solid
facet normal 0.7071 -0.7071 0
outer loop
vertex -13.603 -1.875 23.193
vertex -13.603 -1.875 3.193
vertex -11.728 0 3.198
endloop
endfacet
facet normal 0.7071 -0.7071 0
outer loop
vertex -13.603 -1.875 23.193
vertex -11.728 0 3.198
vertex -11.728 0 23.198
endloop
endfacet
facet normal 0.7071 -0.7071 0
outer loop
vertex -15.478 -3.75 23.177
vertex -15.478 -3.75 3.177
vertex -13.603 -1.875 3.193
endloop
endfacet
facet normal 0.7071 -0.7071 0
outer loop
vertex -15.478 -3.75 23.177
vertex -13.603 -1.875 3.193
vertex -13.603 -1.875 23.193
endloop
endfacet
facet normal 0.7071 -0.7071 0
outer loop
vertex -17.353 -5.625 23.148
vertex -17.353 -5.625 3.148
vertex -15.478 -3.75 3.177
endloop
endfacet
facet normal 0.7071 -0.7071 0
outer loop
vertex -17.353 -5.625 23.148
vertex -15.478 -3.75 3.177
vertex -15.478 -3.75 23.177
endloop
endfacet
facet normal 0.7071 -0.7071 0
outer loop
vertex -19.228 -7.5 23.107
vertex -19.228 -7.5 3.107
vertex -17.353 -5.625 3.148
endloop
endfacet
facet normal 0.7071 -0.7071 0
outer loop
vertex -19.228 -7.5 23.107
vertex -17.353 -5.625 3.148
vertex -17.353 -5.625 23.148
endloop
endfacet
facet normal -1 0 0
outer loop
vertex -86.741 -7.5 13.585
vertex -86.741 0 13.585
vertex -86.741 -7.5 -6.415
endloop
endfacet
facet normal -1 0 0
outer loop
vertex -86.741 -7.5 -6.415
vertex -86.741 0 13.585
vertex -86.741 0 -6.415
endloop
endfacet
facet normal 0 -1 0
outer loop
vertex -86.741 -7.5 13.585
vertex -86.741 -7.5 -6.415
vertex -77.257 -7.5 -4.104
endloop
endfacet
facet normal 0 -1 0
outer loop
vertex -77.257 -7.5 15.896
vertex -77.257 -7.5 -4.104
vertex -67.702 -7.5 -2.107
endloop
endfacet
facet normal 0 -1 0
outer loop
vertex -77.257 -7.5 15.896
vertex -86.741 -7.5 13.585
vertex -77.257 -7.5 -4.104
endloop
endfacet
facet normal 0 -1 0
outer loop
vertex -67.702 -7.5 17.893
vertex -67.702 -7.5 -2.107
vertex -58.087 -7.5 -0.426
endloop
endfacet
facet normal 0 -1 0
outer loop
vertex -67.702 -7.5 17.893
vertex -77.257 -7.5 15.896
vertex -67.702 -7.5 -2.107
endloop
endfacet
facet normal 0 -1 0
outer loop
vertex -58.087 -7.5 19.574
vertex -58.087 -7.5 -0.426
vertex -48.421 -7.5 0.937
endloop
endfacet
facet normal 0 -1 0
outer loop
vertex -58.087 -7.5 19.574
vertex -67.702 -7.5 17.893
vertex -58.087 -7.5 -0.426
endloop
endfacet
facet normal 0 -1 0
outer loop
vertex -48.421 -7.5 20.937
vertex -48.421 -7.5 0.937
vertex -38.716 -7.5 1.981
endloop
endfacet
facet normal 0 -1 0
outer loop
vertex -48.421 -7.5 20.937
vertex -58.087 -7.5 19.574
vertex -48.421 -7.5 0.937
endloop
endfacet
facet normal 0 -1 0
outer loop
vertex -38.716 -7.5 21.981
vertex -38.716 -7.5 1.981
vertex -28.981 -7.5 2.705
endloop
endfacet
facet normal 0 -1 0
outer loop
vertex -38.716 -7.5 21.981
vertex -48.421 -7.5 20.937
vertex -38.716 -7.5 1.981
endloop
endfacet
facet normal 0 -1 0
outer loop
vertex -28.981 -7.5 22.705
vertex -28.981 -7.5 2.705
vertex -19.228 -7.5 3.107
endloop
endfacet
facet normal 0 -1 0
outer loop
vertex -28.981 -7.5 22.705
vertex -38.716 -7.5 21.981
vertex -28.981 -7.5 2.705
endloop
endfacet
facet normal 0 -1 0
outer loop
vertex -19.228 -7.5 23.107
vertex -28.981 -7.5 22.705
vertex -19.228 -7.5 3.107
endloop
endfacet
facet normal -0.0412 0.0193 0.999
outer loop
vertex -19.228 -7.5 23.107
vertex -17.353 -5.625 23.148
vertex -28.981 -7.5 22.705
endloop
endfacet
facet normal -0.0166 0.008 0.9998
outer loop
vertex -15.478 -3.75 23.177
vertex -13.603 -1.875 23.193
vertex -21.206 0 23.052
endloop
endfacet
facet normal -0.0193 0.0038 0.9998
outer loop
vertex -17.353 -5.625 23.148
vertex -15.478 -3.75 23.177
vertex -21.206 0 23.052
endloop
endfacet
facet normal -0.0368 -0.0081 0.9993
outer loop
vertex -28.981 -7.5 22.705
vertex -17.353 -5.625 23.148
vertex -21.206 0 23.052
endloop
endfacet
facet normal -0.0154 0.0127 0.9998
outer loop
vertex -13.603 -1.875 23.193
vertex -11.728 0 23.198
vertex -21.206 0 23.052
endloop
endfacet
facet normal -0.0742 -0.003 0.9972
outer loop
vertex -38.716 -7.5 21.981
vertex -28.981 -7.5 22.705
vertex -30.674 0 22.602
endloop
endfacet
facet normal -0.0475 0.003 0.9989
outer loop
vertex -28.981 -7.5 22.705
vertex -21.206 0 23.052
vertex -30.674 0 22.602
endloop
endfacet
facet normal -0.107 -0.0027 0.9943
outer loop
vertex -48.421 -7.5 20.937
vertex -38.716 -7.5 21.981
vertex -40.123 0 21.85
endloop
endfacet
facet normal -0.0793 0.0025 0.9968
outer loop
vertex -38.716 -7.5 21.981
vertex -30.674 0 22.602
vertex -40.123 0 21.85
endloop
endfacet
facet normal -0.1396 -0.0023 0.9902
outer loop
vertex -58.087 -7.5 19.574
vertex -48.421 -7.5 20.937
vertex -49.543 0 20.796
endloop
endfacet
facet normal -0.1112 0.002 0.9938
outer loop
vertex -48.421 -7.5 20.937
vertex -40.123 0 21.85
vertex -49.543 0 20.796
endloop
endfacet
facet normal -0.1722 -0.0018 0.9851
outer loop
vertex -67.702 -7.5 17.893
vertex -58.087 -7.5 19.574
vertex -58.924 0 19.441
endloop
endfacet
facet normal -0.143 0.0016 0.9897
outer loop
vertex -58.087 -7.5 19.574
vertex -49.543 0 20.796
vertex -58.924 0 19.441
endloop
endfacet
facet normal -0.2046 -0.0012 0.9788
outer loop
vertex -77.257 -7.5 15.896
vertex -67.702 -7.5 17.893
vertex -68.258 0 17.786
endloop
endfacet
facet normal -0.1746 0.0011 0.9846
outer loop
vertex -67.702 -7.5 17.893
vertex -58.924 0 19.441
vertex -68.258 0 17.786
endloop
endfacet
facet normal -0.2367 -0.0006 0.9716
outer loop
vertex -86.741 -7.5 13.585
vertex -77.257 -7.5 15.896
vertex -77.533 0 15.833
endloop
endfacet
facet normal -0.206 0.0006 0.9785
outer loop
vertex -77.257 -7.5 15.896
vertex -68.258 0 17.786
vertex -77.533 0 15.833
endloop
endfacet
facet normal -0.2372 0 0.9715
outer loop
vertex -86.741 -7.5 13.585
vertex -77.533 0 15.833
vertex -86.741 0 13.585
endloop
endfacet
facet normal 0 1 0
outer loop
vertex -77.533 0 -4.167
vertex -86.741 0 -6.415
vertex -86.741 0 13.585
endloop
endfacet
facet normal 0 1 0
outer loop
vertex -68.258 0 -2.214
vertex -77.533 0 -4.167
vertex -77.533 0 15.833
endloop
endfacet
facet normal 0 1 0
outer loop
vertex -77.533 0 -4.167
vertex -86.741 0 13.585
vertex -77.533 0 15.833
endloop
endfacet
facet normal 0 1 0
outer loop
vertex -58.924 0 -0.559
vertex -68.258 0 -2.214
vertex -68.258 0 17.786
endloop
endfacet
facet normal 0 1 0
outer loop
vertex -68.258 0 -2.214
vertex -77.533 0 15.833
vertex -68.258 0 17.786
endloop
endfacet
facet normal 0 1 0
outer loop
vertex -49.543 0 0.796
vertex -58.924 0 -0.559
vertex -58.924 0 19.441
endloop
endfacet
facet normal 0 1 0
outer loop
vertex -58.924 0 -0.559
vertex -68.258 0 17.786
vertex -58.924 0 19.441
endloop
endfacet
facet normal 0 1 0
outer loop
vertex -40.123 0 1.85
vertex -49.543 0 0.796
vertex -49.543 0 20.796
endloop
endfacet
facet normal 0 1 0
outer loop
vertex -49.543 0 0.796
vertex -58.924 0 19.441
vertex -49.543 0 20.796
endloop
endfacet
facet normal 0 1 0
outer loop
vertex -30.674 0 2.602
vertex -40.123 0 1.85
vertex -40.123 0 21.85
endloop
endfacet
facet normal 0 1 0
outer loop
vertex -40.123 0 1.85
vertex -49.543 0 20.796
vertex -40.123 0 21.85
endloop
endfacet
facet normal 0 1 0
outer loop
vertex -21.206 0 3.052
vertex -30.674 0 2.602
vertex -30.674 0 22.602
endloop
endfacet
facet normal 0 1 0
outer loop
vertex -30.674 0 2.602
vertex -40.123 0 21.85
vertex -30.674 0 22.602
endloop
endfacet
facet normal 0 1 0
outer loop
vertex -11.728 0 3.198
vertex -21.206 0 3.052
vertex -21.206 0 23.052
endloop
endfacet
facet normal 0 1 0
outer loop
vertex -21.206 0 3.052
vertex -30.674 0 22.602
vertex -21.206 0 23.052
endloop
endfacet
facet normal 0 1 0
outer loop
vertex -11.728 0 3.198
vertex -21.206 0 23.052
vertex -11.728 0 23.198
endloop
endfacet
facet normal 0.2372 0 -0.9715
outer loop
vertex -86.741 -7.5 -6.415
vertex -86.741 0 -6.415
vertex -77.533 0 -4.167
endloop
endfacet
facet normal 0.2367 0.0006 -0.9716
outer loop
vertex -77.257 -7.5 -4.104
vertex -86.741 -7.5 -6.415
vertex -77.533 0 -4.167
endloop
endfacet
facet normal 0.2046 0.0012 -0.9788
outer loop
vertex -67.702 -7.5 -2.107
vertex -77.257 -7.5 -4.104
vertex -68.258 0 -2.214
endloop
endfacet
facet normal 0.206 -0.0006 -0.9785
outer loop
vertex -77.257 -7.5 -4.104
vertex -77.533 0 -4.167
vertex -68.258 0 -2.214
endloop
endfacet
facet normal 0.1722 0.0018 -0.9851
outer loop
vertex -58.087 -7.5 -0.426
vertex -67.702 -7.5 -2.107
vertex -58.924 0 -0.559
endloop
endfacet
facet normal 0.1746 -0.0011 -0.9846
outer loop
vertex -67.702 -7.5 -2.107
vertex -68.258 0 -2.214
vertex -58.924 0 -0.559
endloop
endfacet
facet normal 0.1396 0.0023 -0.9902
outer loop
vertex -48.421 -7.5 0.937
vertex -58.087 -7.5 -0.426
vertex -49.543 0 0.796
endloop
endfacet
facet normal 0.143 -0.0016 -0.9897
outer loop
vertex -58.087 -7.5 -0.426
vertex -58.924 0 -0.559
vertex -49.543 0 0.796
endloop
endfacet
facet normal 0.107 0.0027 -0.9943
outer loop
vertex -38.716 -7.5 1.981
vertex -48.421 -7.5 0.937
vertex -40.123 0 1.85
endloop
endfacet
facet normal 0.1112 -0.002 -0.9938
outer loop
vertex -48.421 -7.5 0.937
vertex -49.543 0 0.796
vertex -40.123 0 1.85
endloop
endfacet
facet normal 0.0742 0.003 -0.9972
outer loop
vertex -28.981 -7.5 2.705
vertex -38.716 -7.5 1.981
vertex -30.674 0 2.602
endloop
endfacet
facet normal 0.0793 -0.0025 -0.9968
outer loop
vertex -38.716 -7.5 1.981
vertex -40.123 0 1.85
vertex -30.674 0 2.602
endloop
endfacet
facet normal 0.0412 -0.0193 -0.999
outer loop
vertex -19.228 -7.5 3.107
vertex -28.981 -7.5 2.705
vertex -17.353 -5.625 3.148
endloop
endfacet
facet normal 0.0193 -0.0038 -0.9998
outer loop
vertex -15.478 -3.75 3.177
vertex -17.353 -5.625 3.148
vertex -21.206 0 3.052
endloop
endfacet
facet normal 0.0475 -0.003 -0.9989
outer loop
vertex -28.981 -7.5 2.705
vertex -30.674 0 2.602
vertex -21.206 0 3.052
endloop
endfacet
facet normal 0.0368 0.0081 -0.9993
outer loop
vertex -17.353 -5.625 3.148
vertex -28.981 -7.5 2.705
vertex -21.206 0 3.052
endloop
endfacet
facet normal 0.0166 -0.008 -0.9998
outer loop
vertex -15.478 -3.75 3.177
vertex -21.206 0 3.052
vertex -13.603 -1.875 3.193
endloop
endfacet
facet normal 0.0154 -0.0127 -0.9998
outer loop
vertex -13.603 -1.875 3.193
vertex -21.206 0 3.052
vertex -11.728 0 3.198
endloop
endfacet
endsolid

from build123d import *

# Parameters (mm, degrees)
F1_DEPTH = 7.5
F2_SIZE  = 7.49999


# Not quite as in the source:
# - a fillet or chamfer is up to 0.001 mm smaller than in the source, because OpenCascade refuses the exact size


with BuildPart() as f1:
    # F0 (on Front) → F1 (new body)
    with BuildSketch(Plane.XZ):
        with BuildLine():
            Line((-86.7414106019, 13.5850626232), (-86.7414106019, -6.4149373768))
            ThreePointArc((-86.7414106019, -6.4149373768), (-49.5427734858, 0.7956791903), (-11.7279719579, 3.1982569702))
            Line((-11.7279719579, 3.1982569702), (-11.7279719579, 23.1982569702))
            ThreePointArc((-11.7279719579, 23.1982569702), (-49.5427734858, 20.7956791903), (-86.7414106019, 13.5850626232))
        make_face()
    extrude(amount=F1_DEPTH)

    # F2 (size 7.5 in the source; OpenCascade refuses exactly that, so slightly less here)
    f2_edges = [f1.edges().sort_by_distance(p)[0] for p in [
        (-11.727972, -7.5, 13.198257),
    ]]
    chamfer(f2_edges, length=F2_SIZE)


solid = f1.part
